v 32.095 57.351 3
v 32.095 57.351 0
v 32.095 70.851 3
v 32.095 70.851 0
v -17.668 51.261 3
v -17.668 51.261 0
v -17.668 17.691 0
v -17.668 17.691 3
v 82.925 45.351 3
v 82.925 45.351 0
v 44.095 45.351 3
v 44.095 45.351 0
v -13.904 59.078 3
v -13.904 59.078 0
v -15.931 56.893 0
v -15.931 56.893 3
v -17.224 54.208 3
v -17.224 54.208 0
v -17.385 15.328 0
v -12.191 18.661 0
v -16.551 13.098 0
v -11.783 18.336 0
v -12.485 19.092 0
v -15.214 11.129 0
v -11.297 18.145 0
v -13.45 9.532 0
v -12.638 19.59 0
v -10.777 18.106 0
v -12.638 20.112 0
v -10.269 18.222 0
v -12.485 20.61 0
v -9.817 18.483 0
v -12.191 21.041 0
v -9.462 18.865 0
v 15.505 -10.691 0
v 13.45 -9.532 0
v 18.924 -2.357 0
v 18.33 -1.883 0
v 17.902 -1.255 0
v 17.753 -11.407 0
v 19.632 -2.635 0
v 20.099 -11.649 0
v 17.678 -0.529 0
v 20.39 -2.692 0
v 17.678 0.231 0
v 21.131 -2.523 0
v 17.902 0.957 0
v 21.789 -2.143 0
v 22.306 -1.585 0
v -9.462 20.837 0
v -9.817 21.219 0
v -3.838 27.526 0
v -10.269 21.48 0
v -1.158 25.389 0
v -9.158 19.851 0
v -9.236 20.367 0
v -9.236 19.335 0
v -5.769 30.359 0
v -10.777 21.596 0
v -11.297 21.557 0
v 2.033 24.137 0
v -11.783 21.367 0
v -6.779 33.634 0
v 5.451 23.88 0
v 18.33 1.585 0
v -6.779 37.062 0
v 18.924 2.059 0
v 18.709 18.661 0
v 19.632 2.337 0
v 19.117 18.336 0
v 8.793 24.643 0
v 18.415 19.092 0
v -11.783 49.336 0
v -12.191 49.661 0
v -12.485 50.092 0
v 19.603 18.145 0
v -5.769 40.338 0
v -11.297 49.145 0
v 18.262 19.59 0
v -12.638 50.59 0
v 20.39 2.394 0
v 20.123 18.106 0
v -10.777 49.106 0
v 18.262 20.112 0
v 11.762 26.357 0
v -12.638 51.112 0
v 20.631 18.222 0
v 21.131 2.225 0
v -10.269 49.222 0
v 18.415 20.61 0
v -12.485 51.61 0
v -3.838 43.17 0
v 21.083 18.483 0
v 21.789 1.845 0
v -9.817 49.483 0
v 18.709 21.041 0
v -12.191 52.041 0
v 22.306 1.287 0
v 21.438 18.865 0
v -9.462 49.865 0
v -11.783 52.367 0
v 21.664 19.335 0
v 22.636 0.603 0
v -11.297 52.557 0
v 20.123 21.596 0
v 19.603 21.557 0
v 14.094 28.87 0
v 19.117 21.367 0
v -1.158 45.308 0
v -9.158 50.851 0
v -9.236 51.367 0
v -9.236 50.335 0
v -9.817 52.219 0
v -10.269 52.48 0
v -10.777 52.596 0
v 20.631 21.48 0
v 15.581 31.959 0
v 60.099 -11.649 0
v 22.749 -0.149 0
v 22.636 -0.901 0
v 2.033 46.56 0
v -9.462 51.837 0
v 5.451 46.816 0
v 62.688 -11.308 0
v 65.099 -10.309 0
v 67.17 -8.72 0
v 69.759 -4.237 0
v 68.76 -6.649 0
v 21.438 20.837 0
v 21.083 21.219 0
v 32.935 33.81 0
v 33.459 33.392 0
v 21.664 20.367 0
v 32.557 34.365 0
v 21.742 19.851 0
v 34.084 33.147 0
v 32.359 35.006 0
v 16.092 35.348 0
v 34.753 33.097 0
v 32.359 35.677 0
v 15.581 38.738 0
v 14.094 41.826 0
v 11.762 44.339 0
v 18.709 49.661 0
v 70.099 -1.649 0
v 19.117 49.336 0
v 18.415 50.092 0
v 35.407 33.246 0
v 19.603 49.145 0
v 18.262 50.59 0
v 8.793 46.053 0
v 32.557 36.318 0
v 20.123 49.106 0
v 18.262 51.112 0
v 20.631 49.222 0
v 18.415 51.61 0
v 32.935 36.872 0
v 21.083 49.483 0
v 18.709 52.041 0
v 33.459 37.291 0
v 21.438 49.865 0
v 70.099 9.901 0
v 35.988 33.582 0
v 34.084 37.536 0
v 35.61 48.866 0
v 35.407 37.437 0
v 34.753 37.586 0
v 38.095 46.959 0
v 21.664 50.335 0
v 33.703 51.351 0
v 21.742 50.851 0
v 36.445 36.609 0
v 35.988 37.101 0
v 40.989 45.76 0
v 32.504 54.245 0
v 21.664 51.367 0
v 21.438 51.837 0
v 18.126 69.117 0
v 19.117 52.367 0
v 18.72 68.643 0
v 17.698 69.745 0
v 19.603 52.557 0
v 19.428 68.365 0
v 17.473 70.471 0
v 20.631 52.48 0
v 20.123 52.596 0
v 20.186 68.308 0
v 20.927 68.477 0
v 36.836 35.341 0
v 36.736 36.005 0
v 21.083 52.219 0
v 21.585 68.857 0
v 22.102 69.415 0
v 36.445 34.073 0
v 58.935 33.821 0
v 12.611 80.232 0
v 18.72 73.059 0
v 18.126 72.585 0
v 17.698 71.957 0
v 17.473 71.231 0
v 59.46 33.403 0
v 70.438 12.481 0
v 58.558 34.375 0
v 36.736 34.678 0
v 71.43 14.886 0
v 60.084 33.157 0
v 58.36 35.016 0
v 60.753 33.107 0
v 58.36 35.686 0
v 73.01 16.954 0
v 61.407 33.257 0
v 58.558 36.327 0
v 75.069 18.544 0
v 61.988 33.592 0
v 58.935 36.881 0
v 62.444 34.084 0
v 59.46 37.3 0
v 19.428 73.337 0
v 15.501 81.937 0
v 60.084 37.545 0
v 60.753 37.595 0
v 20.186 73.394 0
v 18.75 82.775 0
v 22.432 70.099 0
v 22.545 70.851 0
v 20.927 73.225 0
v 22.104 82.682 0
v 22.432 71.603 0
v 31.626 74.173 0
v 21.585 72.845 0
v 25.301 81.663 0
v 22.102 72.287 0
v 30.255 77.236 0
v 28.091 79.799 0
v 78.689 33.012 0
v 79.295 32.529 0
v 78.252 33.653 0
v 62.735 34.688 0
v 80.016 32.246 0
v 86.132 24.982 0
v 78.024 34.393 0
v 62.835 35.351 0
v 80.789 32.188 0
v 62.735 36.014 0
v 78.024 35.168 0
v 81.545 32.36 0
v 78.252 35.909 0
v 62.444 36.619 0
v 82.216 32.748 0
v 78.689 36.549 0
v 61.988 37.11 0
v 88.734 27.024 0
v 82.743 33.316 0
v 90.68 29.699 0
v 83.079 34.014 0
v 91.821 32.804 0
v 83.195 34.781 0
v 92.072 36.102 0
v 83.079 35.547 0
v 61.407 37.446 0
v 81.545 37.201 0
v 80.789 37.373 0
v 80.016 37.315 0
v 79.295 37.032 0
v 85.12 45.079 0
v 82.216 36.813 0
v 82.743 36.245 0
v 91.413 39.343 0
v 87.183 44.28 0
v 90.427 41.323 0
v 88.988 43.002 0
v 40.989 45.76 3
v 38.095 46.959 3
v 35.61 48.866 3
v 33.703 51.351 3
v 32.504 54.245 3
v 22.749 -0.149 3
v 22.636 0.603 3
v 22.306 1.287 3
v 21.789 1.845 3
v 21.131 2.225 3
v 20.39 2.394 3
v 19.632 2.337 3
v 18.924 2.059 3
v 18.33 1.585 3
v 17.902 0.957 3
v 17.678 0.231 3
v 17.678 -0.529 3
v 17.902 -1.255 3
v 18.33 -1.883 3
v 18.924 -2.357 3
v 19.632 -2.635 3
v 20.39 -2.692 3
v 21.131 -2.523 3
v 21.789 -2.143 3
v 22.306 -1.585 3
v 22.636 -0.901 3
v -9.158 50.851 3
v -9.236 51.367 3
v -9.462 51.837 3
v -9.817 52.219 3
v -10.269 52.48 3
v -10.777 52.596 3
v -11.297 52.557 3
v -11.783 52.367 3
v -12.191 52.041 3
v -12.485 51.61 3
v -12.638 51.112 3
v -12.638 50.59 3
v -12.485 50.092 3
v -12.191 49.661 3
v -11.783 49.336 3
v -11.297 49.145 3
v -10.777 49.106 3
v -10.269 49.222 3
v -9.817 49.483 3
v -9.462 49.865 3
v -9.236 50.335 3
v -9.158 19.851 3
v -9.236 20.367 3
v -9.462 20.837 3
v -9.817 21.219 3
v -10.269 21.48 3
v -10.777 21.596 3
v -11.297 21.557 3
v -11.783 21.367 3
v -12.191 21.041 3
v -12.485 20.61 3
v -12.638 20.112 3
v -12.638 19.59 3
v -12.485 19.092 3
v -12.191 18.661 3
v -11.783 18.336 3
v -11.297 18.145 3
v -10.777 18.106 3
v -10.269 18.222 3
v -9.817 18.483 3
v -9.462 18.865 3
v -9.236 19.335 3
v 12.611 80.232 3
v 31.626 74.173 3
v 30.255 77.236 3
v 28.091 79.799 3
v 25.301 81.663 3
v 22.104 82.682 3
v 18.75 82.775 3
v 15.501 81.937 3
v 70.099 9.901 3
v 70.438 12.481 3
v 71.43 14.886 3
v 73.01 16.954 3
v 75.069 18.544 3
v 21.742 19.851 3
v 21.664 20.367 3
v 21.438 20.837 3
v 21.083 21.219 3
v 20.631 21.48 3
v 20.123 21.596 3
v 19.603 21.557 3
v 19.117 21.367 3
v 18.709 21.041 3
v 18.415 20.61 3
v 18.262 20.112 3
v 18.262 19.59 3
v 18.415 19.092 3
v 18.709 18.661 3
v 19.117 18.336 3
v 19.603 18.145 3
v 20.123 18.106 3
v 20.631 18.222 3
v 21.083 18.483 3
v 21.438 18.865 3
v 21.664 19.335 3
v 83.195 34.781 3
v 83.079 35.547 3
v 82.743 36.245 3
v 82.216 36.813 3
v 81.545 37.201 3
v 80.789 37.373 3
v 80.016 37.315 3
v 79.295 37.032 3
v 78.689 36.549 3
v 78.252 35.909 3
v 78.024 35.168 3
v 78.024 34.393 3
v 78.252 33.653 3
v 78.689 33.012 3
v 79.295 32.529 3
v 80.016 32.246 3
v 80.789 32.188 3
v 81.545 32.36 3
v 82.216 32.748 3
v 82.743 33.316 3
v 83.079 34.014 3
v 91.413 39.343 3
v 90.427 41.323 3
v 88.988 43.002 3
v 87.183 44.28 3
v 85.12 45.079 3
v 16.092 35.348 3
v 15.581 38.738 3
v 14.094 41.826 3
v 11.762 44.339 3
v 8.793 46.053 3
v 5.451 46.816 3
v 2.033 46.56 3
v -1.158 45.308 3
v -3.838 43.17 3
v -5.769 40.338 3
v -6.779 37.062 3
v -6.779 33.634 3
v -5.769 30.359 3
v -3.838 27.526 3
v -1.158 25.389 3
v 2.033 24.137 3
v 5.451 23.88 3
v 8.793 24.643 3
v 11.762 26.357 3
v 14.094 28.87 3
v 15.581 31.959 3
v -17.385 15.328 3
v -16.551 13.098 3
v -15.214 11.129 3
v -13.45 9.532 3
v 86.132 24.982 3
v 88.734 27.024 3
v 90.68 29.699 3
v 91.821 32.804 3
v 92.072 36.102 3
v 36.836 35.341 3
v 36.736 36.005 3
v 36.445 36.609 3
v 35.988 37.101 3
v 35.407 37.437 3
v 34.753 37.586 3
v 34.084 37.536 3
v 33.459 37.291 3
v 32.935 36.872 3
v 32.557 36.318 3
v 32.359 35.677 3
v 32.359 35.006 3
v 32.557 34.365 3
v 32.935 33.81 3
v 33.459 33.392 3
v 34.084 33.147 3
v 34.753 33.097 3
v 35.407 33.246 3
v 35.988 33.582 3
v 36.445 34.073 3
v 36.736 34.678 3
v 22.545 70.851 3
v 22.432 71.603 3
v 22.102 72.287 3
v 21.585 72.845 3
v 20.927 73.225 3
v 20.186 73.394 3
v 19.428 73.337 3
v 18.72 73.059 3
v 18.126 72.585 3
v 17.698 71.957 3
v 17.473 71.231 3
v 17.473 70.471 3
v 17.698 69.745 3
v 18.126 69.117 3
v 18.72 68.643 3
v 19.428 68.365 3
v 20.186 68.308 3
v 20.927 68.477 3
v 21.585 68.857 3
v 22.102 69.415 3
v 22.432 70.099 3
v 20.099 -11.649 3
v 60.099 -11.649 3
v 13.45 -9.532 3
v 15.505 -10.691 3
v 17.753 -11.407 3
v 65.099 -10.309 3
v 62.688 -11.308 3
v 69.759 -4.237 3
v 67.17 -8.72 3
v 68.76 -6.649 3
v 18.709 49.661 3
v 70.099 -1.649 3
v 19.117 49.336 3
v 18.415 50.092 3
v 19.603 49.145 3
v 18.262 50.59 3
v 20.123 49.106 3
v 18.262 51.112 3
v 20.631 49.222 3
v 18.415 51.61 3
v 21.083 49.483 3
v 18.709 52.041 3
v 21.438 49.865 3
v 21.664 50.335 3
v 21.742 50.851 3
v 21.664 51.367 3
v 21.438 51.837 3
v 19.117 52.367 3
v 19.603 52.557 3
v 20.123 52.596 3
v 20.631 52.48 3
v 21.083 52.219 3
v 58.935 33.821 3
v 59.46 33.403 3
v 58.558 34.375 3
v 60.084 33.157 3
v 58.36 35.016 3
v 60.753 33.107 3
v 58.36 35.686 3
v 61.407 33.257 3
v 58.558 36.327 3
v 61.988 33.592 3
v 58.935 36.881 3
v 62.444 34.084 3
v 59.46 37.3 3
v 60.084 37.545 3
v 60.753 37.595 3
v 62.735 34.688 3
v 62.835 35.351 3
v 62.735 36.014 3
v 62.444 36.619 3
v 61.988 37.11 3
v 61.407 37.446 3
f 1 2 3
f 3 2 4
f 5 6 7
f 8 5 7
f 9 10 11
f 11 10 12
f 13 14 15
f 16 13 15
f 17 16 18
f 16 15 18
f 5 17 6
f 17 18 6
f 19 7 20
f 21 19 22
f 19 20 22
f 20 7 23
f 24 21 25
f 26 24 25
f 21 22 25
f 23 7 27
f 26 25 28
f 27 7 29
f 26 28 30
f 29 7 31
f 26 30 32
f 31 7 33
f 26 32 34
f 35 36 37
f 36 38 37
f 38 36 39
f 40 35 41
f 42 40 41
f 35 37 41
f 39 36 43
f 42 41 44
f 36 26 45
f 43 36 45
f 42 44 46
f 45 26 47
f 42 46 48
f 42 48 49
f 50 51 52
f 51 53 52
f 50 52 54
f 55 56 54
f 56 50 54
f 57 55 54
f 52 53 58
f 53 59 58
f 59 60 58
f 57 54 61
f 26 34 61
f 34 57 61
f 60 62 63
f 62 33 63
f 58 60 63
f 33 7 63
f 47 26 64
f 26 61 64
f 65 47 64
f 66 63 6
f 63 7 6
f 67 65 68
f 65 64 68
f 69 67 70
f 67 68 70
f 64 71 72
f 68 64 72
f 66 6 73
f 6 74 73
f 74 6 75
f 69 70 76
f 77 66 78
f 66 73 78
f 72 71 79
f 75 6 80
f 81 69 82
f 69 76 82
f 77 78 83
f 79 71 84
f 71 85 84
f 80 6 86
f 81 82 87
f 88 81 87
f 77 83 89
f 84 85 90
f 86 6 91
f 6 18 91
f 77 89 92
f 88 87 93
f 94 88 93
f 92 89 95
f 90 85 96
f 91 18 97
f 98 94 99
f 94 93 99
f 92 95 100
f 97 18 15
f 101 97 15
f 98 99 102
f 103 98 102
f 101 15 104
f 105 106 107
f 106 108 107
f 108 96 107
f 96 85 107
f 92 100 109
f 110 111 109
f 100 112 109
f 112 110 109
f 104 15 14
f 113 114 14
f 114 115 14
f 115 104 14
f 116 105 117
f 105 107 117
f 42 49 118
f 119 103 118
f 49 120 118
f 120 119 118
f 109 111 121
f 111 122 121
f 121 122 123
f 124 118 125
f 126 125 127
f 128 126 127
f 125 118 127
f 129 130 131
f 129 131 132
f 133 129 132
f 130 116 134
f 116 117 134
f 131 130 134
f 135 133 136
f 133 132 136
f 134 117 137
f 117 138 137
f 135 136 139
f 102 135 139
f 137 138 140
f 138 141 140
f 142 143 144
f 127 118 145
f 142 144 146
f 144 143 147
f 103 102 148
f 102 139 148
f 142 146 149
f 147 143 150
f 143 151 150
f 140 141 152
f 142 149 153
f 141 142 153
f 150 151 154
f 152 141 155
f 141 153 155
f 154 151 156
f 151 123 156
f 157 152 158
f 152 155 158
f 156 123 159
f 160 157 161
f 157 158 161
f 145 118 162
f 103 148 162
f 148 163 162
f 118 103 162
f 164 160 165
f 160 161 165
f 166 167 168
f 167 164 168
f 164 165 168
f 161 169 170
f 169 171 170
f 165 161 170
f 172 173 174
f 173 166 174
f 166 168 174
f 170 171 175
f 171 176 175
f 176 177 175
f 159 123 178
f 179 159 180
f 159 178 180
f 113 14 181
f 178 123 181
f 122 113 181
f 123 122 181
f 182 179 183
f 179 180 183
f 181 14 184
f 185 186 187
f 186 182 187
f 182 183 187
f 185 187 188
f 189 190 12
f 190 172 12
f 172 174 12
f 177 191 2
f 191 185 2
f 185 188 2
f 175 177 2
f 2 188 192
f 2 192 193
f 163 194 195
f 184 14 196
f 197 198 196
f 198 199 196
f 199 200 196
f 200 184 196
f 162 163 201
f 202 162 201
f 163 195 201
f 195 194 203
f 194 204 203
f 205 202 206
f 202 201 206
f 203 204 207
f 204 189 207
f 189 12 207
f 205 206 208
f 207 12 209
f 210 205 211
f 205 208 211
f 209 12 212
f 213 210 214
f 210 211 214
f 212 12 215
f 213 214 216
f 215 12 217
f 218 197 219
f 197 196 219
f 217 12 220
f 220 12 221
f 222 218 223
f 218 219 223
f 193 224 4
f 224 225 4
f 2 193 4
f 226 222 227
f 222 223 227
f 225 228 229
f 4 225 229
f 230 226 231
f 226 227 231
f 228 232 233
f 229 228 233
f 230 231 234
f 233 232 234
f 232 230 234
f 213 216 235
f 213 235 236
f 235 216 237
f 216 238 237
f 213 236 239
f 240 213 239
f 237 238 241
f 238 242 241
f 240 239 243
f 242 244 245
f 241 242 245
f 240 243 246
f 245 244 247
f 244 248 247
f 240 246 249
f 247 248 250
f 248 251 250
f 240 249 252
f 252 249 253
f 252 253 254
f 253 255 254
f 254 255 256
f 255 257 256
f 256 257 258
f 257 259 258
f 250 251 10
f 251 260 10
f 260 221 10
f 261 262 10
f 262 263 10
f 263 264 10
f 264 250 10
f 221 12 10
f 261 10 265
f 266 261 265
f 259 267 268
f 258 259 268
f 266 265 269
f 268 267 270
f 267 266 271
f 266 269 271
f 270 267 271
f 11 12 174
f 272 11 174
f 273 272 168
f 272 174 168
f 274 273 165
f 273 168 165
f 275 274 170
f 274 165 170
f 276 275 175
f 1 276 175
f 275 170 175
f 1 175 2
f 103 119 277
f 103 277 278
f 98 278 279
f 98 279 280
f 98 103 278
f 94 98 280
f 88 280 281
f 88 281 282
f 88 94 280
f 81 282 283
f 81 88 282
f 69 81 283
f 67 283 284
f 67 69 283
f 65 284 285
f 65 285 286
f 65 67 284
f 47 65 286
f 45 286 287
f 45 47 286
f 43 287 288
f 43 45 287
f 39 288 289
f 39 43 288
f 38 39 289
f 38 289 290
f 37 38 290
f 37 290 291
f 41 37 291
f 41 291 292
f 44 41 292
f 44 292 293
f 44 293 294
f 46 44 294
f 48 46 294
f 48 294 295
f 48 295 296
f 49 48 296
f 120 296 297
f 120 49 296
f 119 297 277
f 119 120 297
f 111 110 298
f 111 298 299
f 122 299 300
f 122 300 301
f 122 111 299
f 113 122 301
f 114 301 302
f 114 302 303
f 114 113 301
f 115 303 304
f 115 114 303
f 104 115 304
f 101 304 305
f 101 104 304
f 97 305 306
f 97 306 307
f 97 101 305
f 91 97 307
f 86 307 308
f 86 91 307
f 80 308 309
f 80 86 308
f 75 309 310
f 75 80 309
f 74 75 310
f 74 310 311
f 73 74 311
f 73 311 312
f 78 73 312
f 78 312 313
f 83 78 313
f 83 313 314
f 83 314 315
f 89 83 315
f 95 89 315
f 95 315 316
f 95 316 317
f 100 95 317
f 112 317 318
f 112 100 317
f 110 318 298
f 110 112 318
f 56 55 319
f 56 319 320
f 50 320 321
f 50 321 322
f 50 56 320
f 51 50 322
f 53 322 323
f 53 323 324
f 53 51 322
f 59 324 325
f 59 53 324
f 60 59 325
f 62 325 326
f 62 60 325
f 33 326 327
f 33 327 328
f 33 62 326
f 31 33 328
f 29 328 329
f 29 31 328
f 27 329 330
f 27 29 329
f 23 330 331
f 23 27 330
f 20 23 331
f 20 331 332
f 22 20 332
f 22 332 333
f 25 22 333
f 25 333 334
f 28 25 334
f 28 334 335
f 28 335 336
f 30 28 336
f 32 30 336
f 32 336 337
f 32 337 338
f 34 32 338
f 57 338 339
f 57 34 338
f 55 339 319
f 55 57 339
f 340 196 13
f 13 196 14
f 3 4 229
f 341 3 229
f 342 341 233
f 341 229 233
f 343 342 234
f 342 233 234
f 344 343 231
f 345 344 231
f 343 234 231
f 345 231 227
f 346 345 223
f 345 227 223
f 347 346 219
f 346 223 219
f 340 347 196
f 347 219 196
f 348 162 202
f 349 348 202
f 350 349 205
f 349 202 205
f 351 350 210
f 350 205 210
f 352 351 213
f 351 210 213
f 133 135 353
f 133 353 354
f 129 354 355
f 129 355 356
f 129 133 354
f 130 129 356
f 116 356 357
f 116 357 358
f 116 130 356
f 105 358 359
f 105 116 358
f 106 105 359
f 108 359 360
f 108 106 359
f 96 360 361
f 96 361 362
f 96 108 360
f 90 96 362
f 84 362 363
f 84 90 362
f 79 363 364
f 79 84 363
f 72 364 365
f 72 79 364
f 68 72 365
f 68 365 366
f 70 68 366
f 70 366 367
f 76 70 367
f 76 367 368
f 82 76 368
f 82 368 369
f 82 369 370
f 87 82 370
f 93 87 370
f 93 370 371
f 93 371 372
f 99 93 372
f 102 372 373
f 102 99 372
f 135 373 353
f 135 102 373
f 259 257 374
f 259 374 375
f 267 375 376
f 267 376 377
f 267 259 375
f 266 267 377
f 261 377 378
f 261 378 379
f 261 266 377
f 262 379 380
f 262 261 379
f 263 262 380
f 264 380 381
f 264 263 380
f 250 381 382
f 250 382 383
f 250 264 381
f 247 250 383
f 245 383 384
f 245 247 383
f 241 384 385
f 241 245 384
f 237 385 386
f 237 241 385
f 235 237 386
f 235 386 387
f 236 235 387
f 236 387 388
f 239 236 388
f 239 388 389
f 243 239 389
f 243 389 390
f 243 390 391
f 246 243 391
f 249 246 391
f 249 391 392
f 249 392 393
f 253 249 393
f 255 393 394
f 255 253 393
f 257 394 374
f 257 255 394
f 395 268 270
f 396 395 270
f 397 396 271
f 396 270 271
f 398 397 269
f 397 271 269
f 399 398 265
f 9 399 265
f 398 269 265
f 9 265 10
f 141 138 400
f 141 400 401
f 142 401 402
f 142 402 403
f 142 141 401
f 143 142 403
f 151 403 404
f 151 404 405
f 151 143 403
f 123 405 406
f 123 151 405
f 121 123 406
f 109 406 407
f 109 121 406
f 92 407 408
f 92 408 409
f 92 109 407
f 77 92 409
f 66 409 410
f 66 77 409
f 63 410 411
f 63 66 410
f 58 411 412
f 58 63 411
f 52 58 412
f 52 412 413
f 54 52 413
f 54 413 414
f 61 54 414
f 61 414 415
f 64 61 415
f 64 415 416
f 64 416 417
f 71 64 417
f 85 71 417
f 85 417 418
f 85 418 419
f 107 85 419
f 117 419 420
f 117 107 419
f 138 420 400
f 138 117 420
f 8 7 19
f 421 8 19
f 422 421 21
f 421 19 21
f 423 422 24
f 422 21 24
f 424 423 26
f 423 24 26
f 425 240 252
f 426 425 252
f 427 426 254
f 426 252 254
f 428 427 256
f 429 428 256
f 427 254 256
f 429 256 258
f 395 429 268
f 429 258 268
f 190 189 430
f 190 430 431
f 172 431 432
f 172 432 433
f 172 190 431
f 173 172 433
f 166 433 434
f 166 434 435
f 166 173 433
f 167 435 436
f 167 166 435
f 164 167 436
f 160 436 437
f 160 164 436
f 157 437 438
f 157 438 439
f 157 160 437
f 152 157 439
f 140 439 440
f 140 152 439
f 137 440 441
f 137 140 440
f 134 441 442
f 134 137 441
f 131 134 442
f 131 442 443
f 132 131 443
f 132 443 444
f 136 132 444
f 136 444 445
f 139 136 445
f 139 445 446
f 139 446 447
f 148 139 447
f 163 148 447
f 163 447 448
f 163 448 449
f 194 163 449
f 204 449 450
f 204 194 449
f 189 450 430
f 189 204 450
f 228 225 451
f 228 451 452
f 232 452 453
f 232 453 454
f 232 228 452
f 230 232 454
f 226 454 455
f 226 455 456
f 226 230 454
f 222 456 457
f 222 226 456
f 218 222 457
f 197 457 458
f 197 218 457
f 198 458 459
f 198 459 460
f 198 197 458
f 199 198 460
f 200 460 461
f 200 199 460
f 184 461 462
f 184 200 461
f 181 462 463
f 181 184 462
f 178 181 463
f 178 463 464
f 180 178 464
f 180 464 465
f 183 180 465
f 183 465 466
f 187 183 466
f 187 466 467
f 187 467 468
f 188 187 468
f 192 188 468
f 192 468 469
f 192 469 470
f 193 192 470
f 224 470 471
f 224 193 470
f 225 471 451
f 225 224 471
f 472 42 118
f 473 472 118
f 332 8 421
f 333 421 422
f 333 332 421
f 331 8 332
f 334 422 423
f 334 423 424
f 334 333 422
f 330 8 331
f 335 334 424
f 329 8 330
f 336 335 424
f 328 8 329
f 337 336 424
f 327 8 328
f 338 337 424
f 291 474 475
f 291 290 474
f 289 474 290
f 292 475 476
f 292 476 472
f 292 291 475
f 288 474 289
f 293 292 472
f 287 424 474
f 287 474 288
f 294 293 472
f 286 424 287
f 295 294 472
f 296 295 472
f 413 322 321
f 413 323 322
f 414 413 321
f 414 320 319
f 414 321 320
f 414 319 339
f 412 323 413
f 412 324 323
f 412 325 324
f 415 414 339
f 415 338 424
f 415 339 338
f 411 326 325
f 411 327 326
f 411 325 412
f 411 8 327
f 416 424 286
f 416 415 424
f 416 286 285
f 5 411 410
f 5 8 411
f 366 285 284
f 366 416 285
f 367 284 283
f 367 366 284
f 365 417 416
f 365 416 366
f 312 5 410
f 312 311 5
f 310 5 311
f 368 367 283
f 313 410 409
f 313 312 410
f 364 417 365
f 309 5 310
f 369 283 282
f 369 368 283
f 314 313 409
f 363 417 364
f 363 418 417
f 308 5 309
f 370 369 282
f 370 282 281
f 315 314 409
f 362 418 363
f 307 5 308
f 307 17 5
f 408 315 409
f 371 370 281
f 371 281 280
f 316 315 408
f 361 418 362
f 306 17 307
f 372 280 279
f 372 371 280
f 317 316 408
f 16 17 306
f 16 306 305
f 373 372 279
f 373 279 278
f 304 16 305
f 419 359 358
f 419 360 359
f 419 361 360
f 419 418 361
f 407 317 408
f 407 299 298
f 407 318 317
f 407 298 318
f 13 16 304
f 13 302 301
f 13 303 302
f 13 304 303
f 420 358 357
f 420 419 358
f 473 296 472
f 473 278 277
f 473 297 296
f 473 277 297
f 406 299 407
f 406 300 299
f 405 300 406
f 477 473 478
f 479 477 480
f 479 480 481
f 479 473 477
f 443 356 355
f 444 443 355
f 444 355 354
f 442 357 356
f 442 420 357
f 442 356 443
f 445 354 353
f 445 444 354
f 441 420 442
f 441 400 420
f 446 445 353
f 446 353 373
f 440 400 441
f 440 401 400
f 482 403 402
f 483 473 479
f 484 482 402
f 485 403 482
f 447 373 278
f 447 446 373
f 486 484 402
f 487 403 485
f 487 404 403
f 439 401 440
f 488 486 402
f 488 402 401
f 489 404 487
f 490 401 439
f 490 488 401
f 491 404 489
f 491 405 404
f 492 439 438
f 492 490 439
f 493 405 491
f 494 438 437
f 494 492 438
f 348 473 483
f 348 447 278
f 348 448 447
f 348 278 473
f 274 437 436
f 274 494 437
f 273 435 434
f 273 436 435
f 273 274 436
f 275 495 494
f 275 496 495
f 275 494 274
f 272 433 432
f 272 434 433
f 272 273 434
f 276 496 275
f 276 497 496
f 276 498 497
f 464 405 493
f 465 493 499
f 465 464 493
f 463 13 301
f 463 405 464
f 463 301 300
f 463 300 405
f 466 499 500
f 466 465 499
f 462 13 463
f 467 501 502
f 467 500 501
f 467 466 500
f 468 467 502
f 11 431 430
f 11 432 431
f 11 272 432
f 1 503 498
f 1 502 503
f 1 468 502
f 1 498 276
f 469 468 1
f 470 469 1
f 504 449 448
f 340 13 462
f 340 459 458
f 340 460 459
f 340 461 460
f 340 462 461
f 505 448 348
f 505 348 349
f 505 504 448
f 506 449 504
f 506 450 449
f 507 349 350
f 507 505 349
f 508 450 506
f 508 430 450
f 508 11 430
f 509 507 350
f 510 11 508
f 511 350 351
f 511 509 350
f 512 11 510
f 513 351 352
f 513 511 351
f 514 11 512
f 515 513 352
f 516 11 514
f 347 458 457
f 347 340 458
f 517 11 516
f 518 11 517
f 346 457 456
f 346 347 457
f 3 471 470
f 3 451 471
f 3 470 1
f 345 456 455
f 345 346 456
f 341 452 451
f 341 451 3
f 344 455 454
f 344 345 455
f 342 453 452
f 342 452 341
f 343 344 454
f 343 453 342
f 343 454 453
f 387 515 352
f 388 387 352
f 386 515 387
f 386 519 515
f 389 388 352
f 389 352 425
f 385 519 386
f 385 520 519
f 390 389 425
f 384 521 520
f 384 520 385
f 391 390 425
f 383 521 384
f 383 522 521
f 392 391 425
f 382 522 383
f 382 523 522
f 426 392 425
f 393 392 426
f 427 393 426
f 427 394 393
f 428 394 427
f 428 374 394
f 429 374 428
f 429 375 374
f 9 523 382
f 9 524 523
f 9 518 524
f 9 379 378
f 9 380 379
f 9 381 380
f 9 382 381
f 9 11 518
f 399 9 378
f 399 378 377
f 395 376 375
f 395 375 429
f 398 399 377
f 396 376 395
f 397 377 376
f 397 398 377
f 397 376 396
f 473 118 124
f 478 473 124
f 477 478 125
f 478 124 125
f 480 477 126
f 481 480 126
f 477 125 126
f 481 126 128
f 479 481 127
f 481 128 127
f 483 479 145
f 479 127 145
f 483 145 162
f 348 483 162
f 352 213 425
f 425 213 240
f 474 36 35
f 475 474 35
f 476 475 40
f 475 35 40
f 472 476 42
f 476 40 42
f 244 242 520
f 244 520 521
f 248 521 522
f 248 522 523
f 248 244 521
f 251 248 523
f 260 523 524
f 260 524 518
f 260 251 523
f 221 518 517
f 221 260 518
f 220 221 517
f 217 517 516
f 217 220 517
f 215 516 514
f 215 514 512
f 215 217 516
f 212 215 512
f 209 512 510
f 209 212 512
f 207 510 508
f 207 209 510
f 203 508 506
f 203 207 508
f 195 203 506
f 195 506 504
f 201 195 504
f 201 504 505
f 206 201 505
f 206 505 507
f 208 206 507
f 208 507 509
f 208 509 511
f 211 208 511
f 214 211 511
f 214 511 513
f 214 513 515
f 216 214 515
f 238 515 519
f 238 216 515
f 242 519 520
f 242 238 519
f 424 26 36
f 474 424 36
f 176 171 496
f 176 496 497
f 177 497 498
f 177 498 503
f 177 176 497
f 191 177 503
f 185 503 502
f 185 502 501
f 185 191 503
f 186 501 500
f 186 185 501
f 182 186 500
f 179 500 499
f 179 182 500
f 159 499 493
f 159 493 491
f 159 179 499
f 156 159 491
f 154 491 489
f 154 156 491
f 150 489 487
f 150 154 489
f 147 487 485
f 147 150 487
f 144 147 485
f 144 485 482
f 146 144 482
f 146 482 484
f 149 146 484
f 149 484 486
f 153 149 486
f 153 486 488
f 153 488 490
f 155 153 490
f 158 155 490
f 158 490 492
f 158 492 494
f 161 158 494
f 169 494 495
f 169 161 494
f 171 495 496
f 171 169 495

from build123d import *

# Parameters (mm, degrees)
SKETCH1_R           = 2.6
SKETCH1_R_2         = 2.25
SKETCH1_R_3         = 11.5
SKETCH1_R_4         = 2.55
SKETCH1_R_5         = 2.250902383
SKETCH1_R_6         = 1.75
BOSS_EXTRUDE1_DEPTH = 3


with BuildPart() as part:
    # Sketch1 → Boss-Extrude1 (new body)
    with BuildSketch(Plane.XY):
        with BuildLine():
            Line((-17.667944903, 51.26061463), (-17.667944903, 17.69061463))
            ThreePointArc((-17.667944903, 17.69061463), (-16.55108605, 13.098251038), (-13.449984231, 9.531691833))
            Line((-13.449984231, 9.531691833), (13.449984231, -9.531691833))
            ThreePointArc((13.449984231, -9.531691833), (16.610185866, -11.106844514), (20.099329458, -11.648930616))
            Line((20.099329458, -11.648930616), (60.099329458, -11.648930616))
            ThreePointArc((60.099329458, -11.648930616), (67.17039727, -8.719998428), (70.099329458, -1.648930616))
            Line((70.099329458, -1.648930616), (70.099329458, 9.901069384))
            ThreePointArc((70.099329458, 9.901069384), (71.430361969, 14.885946781), (75.069129992, 18.543817403))
            Line((75.069129992, 18.543817403), (86.131847457, 24.98247272))
            ThreePointArc((86.131847457, 24.98247272), (91.358121472, 31.21181519), (91.413130529, 39.342966504))
            ThreePointArc((91.413130529, 39.342966504), (88.124648594, 43.697057203), (82.924988705, 45.351069384))
            Line((82.924988705, 45.351069384), (44.094988705, 45.351069384))
            ThreePointArc((44.094988705, 45.351069384), (35.609707331, 48.86578801), (32.094988705, 57.351069384))
            Line((32.094988705, 57.351069384), (32.094988705, 70.851069384))
            ThreePointArc((32.094988705, 70.851069384), (25.300553143, 81.663196782), (12.611305558, 80.231607031))
            Line((12.611305558, 80.231607031), (-13.904347525, 59.077729336))
            ThreePointArc((-13.904347525, 59.077729336), (-16.678051068, 55.598584995), (-17.667944903, 51.26061463))
        make_face()
        with Locations((80.59476396, 34.780670506)):
            Circle(SKETCH1_R, mode=Mode.SUBTRACT)
        with Locations((60.58476396, 35.351069384)):
            Circle(SKETCH1_R_2, mode=Mode.SUBTRACT)
        with Locations((4.592055097, 35.34829978)):
            Circle(SKETCH1_R_3, mode=Mode.SUBTRACT)
        with Locations((19.994988754, 70.850970592)):
            Circle(SKETCH1_R_4, mode=Mode.SUBTRACT)
        with Locations((34.584765763, 35.341387282)):
            Circle(SKETCH1_R_5, mode=Mode.SUBTRACT)
        with Locations((20.199329409, -0.149029408)):
            Circle(SKETCH1_R_4, mode=Mode.SUBTRACT)
        with Locations((19.992055097, 19.851069384)):
            Circle(SKETCH1_R_6, mode=Mode.SUBTRACT)
        with Locations((-10.907944903, 19.851069384)):
            Circle(SKETCH1_R_6, mode=Mode.SUBTRACT)
        with Locations((-10.907944903, 50.851069384)):
            Circle(SKETCH1_R_6, mode=Mode.SUBTRACT)
        with Locations((19.992055097, 50.851069384)):
            Circle(SKETCH1_R_6, mode=Mode.SUBTRACT)
    extrude(amount=BOSS_EXTRUDE1_DEPTH)


solid = part.part
